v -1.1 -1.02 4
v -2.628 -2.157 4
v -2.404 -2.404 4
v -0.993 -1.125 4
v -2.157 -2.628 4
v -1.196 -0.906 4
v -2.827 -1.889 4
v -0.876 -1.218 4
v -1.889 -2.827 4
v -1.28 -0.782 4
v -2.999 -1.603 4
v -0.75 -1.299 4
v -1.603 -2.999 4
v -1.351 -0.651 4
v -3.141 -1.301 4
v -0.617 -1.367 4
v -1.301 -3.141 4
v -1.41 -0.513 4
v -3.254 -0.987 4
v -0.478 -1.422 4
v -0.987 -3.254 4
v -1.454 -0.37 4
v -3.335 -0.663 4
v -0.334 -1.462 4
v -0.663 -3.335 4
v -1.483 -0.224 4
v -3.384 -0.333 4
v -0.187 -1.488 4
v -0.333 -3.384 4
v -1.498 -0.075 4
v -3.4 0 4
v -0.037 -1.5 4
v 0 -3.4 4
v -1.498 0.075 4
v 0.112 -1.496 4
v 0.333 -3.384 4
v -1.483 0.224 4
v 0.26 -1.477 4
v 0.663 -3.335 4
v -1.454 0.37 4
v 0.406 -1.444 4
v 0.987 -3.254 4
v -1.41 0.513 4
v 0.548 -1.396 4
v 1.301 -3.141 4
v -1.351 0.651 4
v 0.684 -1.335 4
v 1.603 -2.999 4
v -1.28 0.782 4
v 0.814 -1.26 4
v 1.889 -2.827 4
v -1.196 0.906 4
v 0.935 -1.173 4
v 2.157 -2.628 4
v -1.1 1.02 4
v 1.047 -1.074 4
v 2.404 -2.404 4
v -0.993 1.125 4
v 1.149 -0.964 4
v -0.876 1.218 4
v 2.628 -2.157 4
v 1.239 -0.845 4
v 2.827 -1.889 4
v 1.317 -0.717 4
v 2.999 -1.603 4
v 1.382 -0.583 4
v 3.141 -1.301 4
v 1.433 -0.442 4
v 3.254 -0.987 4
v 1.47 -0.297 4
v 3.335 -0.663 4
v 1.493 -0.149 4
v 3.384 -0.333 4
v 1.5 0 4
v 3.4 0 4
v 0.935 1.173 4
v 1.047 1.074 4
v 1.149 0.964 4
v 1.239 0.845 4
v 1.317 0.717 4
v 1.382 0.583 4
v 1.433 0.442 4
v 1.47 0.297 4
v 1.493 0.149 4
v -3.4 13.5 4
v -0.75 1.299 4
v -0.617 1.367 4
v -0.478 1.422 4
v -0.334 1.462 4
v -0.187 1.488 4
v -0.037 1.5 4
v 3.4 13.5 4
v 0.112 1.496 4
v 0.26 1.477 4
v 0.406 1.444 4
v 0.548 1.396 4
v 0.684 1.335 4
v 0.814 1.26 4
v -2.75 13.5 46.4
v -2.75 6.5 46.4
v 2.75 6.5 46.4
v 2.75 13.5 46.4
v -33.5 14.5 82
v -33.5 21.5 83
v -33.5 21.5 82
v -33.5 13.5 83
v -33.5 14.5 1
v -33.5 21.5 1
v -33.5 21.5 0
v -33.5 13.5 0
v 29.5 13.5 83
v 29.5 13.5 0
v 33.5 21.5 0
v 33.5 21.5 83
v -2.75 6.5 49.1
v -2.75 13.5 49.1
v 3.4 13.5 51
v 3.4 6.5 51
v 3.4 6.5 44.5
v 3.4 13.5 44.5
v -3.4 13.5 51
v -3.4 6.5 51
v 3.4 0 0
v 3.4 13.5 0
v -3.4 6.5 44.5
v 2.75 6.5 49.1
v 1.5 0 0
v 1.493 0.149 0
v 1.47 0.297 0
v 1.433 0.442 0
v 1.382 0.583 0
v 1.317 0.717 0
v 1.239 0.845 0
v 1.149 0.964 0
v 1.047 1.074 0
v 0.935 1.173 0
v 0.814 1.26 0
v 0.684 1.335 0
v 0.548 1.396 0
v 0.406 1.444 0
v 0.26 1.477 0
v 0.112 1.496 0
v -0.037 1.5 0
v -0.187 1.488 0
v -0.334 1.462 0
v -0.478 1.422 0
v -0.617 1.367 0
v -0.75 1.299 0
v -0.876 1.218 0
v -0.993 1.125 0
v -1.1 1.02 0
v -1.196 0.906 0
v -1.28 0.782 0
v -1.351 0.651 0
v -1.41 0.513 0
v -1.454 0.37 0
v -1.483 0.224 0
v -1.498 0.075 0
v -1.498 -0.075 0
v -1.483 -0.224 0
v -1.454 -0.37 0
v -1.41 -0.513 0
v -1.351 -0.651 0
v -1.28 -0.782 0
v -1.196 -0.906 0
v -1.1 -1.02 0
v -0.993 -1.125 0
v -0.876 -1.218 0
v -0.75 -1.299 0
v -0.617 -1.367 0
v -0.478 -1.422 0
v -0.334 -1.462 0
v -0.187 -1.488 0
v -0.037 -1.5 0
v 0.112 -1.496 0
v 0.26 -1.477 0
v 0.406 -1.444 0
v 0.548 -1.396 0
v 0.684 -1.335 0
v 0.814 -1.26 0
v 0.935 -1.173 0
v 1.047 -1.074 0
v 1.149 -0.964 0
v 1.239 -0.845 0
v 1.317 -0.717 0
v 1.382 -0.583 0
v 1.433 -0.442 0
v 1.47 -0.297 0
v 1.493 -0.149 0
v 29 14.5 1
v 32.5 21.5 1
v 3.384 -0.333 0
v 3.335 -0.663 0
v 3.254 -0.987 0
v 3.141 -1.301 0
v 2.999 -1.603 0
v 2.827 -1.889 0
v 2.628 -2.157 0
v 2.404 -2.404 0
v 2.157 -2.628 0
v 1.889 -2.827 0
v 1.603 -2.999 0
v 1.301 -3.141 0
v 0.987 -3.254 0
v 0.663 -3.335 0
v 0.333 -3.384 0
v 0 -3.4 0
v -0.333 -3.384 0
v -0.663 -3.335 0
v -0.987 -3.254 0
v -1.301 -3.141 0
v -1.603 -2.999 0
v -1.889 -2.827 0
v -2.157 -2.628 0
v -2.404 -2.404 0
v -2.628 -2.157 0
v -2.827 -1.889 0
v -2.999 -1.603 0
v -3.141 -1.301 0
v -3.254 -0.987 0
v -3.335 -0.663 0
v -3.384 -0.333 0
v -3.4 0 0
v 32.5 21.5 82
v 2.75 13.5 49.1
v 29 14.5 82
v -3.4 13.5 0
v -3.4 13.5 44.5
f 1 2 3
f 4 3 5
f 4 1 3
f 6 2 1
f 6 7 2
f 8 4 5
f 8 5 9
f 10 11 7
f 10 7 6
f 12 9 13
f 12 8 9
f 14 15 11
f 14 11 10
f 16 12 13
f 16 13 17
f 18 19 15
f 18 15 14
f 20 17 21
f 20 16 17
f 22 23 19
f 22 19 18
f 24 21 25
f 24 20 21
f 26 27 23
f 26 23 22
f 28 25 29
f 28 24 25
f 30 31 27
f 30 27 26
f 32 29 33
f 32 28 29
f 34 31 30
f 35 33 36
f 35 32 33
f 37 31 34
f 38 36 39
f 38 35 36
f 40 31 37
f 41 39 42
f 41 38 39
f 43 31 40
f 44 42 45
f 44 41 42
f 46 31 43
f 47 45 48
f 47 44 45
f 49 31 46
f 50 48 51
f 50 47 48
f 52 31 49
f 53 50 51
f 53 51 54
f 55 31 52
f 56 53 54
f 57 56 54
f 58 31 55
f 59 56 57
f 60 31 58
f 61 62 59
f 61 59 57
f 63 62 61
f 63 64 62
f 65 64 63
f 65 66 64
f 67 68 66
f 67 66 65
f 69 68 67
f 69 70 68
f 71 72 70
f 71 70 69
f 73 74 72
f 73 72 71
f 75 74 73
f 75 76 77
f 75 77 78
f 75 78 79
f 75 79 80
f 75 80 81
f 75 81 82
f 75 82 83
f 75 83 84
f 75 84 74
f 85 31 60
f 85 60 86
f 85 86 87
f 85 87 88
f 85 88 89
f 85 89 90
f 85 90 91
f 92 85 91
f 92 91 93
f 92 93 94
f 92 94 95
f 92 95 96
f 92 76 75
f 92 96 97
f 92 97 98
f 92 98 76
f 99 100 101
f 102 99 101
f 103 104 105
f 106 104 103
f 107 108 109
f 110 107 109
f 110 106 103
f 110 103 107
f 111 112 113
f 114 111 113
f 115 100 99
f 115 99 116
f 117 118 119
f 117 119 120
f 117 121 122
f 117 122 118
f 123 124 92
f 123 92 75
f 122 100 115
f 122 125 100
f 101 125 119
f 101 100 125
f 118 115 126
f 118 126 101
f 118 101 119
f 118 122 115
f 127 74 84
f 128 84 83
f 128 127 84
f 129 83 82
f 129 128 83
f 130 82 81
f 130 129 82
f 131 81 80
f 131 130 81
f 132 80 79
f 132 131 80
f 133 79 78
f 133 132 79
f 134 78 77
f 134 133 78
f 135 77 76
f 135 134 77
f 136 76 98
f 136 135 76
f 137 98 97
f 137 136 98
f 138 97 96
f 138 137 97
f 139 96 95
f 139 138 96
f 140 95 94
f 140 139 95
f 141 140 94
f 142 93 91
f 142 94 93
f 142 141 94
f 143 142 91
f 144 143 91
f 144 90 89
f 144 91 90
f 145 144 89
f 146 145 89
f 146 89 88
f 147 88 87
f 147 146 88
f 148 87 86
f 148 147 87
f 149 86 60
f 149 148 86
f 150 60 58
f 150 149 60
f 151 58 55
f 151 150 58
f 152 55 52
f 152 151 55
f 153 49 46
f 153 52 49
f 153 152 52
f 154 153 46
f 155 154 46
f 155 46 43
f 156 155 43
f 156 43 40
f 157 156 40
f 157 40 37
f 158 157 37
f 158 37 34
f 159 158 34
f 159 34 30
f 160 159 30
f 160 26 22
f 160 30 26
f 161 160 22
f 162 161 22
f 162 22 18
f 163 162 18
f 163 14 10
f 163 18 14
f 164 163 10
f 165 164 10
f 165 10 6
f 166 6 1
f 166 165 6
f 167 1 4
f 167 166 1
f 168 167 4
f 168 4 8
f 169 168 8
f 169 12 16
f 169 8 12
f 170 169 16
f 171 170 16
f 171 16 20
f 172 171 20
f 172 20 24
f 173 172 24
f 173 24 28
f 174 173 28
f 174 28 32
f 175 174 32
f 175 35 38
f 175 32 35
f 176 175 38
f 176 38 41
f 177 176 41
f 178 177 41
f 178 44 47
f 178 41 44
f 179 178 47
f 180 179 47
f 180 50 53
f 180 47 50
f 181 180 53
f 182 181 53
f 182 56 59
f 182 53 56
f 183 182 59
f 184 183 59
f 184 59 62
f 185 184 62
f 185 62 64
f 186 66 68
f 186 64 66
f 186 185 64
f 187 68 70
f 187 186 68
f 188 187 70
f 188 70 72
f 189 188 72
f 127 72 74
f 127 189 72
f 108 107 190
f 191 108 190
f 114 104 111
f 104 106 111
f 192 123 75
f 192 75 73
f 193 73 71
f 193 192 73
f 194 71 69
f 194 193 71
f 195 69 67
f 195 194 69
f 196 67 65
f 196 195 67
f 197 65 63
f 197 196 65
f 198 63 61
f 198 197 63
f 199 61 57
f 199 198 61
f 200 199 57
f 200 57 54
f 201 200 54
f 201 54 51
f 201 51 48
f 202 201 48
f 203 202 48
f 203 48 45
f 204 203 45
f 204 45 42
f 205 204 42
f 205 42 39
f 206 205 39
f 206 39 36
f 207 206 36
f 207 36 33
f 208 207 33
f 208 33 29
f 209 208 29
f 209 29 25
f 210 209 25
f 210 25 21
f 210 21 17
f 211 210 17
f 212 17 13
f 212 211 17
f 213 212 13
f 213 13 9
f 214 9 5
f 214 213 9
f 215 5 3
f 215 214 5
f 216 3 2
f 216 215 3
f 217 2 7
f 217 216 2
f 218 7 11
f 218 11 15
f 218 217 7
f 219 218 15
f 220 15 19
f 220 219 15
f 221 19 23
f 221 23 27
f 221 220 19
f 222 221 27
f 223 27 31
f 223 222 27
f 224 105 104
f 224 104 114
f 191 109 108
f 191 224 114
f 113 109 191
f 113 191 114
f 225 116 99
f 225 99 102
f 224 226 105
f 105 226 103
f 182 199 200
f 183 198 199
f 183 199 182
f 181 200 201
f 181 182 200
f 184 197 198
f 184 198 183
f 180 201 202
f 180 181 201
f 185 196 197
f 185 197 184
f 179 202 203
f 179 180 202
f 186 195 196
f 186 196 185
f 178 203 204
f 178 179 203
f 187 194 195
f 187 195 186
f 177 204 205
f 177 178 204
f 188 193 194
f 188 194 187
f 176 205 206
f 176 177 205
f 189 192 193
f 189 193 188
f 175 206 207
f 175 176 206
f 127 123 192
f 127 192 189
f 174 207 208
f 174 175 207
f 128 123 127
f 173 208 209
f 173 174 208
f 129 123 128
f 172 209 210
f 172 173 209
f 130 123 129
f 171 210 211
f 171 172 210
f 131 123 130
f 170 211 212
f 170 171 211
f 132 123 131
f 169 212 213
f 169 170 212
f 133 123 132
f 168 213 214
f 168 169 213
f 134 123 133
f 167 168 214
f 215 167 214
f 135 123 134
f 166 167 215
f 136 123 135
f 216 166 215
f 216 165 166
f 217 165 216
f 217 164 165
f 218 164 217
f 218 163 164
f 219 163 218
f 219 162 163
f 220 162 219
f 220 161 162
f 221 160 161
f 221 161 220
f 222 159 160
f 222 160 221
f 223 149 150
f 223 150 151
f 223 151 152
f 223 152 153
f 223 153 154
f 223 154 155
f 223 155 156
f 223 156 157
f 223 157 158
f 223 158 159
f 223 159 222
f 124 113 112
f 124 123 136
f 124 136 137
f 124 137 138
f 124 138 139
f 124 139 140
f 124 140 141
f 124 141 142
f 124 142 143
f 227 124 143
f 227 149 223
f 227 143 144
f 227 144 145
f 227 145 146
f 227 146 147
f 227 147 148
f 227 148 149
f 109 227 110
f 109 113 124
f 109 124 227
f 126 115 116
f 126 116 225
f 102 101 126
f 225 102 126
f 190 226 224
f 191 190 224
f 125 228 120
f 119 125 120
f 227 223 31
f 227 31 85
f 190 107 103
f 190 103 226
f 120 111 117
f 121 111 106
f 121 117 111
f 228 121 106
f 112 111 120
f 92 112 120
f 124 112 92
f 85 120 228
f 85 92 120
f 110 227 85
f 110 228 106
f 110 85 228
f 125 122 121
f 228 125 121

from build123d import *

# Parameters (mm, degrees)
SKETCH_2_R          = 1.5
EXTRUDE_1_DEPTH     = 83
SKETCH_3_W          = 62.5
SKETCH_3_H          = 1
SKETCH_3_W_2        = 4.5
SKETCH_3_W_3        = 67
EXTRUDE_2_DEPTH     = 7
CUT_EXTRUDE_1_DEPTH = 83
SKETCH_5_W          = 6.8
SKETCH_5_H          = 16.9
CUT_EXTRUDE_2_DEPTH = 79
SKETCH_7_W          = 6.8
SKETCH_7_H          = 7
EXTRUDE_3_DEPTH     = 38.5
SKETCH_8_W          = 6.8
SKETCH_8_H          = 7
CUT_EXTRUDE_3_DEPTH = 32
SKETCH_9_W          = 5.5
SKETCH_9_H          = 2.7
CUT_EXTRUDE_4_DEPTH = 7


with BuildPart() as part:
    # Эскиз2 → Бобышка-Вытянуть1 (new body)
    with BuildSketch(Plane.XY):
        with BuildLine():
            Line((29, 14.5), (32.5, 21.5))
            Line((32.5, 21.5), (33.5, 21.5))
            Line((33.5, 21.5), (29.5, 13.5))
            Line((29.5, 13.5), (3.4, 13.5))
            Line((3.4, 13.5), (3.4, 0))
            ThreePointArc((3.4, 0), (0, -3.4), (-3.4, 0))
            Line((-3.4, 0), (-3.4, 13.5))
            Line((-3.4, 13.5), (-33.5, 13.5))
            Line((-33.5, 13.5), (-33.5, 14.5))
            Line((-33.5, 14.5), (-32.5, 14.5))
            Line((-32.5, 14.5), (29, 14.5))
        make_face()
        Circle(SKETCH_2_R, mode=Mode.SUBTRACT)
    extrude(amount=EXTRUDE_1_DEPTH)

    # Эскиз3 → Бобышка-Вытянуть2 (add)
    with BuildSketch(Plane(origin=(0, 14.5, 0), x_dir=(1, 0, 0), z_dir=(0, 1, 0))):
        with Locations((-2.25, -82.5)):
            Rectangle(SKETCH_3_W, SKETCH_3_H)
        with Locations((31.25, -82.5)):
            Rectangle(SKETCH_3_W_2, SKETCH_3_H)
        with Locations((0, -0.5)):
            Rectangle(SKETCH_3_W_3, SKETCH_3_H)
    extrude(amount=EXTRUDE_2_DEPTH)

    # Эскиз4 → Вырез-Вытянуть1 (cut)
    with BuildSketch(Plane.XY.offset(83)):
        Polygon((29.5, 13.5), (33.5, 21.5), (33.5, 14.5), align=None)
    extrude(amount=-CUT_EXTRUDE_1_DEPTH, mode=Mode.SUBTRACT)

    # Эскиз5 → Вырез-Вытянуть2 (cut)
    with BuildSketch(Plane.XY.offset(83)):
        with Locations((0, 5.05)):
            Rectangle(SKETCH_5_W, SKETCH_5_H)
    extrude(amount=-CUT_EXTRUDE_2_DEPTH, mode=Mode.SUBTRACT)

    # Эскиз7 → Бобышка-Вытянуть3 (add)
    with BuildSketch(Plane.XY.offset(83)):
        with Locations((0, 10)):
            Rectangle(SKETCH_7_W, SKETCH_7_H)
    extrude(amount=-EXTRUDE_3_DEPTH)

    # Эскиз8 → Вырез-Вытянуть3 (cut)
    with BuildSketch(Plane.XY.offset(83)):
        with Locations((0, 10)):
            Rectangle(SKETCH_8_W, SKETCH_8_H)
    extrude(amount=-CUT_EXTRUDE_3_DEPTH, mode=Mode.SUBTRACT)

    # Эскиз9 → Вырез-Вытянуть4 (cut)
    with BuildSketch(Plane.XZ.offset(-6.5)):
        with Locations((0, 47.75)):
            Rectangle(SKETCH_9_W, SKETCH_9_H)
    extrude(amount=-CUT_EXTRUDE_4_DEPTH, mode=Mode.SUBTRACT)


solid = part.part
